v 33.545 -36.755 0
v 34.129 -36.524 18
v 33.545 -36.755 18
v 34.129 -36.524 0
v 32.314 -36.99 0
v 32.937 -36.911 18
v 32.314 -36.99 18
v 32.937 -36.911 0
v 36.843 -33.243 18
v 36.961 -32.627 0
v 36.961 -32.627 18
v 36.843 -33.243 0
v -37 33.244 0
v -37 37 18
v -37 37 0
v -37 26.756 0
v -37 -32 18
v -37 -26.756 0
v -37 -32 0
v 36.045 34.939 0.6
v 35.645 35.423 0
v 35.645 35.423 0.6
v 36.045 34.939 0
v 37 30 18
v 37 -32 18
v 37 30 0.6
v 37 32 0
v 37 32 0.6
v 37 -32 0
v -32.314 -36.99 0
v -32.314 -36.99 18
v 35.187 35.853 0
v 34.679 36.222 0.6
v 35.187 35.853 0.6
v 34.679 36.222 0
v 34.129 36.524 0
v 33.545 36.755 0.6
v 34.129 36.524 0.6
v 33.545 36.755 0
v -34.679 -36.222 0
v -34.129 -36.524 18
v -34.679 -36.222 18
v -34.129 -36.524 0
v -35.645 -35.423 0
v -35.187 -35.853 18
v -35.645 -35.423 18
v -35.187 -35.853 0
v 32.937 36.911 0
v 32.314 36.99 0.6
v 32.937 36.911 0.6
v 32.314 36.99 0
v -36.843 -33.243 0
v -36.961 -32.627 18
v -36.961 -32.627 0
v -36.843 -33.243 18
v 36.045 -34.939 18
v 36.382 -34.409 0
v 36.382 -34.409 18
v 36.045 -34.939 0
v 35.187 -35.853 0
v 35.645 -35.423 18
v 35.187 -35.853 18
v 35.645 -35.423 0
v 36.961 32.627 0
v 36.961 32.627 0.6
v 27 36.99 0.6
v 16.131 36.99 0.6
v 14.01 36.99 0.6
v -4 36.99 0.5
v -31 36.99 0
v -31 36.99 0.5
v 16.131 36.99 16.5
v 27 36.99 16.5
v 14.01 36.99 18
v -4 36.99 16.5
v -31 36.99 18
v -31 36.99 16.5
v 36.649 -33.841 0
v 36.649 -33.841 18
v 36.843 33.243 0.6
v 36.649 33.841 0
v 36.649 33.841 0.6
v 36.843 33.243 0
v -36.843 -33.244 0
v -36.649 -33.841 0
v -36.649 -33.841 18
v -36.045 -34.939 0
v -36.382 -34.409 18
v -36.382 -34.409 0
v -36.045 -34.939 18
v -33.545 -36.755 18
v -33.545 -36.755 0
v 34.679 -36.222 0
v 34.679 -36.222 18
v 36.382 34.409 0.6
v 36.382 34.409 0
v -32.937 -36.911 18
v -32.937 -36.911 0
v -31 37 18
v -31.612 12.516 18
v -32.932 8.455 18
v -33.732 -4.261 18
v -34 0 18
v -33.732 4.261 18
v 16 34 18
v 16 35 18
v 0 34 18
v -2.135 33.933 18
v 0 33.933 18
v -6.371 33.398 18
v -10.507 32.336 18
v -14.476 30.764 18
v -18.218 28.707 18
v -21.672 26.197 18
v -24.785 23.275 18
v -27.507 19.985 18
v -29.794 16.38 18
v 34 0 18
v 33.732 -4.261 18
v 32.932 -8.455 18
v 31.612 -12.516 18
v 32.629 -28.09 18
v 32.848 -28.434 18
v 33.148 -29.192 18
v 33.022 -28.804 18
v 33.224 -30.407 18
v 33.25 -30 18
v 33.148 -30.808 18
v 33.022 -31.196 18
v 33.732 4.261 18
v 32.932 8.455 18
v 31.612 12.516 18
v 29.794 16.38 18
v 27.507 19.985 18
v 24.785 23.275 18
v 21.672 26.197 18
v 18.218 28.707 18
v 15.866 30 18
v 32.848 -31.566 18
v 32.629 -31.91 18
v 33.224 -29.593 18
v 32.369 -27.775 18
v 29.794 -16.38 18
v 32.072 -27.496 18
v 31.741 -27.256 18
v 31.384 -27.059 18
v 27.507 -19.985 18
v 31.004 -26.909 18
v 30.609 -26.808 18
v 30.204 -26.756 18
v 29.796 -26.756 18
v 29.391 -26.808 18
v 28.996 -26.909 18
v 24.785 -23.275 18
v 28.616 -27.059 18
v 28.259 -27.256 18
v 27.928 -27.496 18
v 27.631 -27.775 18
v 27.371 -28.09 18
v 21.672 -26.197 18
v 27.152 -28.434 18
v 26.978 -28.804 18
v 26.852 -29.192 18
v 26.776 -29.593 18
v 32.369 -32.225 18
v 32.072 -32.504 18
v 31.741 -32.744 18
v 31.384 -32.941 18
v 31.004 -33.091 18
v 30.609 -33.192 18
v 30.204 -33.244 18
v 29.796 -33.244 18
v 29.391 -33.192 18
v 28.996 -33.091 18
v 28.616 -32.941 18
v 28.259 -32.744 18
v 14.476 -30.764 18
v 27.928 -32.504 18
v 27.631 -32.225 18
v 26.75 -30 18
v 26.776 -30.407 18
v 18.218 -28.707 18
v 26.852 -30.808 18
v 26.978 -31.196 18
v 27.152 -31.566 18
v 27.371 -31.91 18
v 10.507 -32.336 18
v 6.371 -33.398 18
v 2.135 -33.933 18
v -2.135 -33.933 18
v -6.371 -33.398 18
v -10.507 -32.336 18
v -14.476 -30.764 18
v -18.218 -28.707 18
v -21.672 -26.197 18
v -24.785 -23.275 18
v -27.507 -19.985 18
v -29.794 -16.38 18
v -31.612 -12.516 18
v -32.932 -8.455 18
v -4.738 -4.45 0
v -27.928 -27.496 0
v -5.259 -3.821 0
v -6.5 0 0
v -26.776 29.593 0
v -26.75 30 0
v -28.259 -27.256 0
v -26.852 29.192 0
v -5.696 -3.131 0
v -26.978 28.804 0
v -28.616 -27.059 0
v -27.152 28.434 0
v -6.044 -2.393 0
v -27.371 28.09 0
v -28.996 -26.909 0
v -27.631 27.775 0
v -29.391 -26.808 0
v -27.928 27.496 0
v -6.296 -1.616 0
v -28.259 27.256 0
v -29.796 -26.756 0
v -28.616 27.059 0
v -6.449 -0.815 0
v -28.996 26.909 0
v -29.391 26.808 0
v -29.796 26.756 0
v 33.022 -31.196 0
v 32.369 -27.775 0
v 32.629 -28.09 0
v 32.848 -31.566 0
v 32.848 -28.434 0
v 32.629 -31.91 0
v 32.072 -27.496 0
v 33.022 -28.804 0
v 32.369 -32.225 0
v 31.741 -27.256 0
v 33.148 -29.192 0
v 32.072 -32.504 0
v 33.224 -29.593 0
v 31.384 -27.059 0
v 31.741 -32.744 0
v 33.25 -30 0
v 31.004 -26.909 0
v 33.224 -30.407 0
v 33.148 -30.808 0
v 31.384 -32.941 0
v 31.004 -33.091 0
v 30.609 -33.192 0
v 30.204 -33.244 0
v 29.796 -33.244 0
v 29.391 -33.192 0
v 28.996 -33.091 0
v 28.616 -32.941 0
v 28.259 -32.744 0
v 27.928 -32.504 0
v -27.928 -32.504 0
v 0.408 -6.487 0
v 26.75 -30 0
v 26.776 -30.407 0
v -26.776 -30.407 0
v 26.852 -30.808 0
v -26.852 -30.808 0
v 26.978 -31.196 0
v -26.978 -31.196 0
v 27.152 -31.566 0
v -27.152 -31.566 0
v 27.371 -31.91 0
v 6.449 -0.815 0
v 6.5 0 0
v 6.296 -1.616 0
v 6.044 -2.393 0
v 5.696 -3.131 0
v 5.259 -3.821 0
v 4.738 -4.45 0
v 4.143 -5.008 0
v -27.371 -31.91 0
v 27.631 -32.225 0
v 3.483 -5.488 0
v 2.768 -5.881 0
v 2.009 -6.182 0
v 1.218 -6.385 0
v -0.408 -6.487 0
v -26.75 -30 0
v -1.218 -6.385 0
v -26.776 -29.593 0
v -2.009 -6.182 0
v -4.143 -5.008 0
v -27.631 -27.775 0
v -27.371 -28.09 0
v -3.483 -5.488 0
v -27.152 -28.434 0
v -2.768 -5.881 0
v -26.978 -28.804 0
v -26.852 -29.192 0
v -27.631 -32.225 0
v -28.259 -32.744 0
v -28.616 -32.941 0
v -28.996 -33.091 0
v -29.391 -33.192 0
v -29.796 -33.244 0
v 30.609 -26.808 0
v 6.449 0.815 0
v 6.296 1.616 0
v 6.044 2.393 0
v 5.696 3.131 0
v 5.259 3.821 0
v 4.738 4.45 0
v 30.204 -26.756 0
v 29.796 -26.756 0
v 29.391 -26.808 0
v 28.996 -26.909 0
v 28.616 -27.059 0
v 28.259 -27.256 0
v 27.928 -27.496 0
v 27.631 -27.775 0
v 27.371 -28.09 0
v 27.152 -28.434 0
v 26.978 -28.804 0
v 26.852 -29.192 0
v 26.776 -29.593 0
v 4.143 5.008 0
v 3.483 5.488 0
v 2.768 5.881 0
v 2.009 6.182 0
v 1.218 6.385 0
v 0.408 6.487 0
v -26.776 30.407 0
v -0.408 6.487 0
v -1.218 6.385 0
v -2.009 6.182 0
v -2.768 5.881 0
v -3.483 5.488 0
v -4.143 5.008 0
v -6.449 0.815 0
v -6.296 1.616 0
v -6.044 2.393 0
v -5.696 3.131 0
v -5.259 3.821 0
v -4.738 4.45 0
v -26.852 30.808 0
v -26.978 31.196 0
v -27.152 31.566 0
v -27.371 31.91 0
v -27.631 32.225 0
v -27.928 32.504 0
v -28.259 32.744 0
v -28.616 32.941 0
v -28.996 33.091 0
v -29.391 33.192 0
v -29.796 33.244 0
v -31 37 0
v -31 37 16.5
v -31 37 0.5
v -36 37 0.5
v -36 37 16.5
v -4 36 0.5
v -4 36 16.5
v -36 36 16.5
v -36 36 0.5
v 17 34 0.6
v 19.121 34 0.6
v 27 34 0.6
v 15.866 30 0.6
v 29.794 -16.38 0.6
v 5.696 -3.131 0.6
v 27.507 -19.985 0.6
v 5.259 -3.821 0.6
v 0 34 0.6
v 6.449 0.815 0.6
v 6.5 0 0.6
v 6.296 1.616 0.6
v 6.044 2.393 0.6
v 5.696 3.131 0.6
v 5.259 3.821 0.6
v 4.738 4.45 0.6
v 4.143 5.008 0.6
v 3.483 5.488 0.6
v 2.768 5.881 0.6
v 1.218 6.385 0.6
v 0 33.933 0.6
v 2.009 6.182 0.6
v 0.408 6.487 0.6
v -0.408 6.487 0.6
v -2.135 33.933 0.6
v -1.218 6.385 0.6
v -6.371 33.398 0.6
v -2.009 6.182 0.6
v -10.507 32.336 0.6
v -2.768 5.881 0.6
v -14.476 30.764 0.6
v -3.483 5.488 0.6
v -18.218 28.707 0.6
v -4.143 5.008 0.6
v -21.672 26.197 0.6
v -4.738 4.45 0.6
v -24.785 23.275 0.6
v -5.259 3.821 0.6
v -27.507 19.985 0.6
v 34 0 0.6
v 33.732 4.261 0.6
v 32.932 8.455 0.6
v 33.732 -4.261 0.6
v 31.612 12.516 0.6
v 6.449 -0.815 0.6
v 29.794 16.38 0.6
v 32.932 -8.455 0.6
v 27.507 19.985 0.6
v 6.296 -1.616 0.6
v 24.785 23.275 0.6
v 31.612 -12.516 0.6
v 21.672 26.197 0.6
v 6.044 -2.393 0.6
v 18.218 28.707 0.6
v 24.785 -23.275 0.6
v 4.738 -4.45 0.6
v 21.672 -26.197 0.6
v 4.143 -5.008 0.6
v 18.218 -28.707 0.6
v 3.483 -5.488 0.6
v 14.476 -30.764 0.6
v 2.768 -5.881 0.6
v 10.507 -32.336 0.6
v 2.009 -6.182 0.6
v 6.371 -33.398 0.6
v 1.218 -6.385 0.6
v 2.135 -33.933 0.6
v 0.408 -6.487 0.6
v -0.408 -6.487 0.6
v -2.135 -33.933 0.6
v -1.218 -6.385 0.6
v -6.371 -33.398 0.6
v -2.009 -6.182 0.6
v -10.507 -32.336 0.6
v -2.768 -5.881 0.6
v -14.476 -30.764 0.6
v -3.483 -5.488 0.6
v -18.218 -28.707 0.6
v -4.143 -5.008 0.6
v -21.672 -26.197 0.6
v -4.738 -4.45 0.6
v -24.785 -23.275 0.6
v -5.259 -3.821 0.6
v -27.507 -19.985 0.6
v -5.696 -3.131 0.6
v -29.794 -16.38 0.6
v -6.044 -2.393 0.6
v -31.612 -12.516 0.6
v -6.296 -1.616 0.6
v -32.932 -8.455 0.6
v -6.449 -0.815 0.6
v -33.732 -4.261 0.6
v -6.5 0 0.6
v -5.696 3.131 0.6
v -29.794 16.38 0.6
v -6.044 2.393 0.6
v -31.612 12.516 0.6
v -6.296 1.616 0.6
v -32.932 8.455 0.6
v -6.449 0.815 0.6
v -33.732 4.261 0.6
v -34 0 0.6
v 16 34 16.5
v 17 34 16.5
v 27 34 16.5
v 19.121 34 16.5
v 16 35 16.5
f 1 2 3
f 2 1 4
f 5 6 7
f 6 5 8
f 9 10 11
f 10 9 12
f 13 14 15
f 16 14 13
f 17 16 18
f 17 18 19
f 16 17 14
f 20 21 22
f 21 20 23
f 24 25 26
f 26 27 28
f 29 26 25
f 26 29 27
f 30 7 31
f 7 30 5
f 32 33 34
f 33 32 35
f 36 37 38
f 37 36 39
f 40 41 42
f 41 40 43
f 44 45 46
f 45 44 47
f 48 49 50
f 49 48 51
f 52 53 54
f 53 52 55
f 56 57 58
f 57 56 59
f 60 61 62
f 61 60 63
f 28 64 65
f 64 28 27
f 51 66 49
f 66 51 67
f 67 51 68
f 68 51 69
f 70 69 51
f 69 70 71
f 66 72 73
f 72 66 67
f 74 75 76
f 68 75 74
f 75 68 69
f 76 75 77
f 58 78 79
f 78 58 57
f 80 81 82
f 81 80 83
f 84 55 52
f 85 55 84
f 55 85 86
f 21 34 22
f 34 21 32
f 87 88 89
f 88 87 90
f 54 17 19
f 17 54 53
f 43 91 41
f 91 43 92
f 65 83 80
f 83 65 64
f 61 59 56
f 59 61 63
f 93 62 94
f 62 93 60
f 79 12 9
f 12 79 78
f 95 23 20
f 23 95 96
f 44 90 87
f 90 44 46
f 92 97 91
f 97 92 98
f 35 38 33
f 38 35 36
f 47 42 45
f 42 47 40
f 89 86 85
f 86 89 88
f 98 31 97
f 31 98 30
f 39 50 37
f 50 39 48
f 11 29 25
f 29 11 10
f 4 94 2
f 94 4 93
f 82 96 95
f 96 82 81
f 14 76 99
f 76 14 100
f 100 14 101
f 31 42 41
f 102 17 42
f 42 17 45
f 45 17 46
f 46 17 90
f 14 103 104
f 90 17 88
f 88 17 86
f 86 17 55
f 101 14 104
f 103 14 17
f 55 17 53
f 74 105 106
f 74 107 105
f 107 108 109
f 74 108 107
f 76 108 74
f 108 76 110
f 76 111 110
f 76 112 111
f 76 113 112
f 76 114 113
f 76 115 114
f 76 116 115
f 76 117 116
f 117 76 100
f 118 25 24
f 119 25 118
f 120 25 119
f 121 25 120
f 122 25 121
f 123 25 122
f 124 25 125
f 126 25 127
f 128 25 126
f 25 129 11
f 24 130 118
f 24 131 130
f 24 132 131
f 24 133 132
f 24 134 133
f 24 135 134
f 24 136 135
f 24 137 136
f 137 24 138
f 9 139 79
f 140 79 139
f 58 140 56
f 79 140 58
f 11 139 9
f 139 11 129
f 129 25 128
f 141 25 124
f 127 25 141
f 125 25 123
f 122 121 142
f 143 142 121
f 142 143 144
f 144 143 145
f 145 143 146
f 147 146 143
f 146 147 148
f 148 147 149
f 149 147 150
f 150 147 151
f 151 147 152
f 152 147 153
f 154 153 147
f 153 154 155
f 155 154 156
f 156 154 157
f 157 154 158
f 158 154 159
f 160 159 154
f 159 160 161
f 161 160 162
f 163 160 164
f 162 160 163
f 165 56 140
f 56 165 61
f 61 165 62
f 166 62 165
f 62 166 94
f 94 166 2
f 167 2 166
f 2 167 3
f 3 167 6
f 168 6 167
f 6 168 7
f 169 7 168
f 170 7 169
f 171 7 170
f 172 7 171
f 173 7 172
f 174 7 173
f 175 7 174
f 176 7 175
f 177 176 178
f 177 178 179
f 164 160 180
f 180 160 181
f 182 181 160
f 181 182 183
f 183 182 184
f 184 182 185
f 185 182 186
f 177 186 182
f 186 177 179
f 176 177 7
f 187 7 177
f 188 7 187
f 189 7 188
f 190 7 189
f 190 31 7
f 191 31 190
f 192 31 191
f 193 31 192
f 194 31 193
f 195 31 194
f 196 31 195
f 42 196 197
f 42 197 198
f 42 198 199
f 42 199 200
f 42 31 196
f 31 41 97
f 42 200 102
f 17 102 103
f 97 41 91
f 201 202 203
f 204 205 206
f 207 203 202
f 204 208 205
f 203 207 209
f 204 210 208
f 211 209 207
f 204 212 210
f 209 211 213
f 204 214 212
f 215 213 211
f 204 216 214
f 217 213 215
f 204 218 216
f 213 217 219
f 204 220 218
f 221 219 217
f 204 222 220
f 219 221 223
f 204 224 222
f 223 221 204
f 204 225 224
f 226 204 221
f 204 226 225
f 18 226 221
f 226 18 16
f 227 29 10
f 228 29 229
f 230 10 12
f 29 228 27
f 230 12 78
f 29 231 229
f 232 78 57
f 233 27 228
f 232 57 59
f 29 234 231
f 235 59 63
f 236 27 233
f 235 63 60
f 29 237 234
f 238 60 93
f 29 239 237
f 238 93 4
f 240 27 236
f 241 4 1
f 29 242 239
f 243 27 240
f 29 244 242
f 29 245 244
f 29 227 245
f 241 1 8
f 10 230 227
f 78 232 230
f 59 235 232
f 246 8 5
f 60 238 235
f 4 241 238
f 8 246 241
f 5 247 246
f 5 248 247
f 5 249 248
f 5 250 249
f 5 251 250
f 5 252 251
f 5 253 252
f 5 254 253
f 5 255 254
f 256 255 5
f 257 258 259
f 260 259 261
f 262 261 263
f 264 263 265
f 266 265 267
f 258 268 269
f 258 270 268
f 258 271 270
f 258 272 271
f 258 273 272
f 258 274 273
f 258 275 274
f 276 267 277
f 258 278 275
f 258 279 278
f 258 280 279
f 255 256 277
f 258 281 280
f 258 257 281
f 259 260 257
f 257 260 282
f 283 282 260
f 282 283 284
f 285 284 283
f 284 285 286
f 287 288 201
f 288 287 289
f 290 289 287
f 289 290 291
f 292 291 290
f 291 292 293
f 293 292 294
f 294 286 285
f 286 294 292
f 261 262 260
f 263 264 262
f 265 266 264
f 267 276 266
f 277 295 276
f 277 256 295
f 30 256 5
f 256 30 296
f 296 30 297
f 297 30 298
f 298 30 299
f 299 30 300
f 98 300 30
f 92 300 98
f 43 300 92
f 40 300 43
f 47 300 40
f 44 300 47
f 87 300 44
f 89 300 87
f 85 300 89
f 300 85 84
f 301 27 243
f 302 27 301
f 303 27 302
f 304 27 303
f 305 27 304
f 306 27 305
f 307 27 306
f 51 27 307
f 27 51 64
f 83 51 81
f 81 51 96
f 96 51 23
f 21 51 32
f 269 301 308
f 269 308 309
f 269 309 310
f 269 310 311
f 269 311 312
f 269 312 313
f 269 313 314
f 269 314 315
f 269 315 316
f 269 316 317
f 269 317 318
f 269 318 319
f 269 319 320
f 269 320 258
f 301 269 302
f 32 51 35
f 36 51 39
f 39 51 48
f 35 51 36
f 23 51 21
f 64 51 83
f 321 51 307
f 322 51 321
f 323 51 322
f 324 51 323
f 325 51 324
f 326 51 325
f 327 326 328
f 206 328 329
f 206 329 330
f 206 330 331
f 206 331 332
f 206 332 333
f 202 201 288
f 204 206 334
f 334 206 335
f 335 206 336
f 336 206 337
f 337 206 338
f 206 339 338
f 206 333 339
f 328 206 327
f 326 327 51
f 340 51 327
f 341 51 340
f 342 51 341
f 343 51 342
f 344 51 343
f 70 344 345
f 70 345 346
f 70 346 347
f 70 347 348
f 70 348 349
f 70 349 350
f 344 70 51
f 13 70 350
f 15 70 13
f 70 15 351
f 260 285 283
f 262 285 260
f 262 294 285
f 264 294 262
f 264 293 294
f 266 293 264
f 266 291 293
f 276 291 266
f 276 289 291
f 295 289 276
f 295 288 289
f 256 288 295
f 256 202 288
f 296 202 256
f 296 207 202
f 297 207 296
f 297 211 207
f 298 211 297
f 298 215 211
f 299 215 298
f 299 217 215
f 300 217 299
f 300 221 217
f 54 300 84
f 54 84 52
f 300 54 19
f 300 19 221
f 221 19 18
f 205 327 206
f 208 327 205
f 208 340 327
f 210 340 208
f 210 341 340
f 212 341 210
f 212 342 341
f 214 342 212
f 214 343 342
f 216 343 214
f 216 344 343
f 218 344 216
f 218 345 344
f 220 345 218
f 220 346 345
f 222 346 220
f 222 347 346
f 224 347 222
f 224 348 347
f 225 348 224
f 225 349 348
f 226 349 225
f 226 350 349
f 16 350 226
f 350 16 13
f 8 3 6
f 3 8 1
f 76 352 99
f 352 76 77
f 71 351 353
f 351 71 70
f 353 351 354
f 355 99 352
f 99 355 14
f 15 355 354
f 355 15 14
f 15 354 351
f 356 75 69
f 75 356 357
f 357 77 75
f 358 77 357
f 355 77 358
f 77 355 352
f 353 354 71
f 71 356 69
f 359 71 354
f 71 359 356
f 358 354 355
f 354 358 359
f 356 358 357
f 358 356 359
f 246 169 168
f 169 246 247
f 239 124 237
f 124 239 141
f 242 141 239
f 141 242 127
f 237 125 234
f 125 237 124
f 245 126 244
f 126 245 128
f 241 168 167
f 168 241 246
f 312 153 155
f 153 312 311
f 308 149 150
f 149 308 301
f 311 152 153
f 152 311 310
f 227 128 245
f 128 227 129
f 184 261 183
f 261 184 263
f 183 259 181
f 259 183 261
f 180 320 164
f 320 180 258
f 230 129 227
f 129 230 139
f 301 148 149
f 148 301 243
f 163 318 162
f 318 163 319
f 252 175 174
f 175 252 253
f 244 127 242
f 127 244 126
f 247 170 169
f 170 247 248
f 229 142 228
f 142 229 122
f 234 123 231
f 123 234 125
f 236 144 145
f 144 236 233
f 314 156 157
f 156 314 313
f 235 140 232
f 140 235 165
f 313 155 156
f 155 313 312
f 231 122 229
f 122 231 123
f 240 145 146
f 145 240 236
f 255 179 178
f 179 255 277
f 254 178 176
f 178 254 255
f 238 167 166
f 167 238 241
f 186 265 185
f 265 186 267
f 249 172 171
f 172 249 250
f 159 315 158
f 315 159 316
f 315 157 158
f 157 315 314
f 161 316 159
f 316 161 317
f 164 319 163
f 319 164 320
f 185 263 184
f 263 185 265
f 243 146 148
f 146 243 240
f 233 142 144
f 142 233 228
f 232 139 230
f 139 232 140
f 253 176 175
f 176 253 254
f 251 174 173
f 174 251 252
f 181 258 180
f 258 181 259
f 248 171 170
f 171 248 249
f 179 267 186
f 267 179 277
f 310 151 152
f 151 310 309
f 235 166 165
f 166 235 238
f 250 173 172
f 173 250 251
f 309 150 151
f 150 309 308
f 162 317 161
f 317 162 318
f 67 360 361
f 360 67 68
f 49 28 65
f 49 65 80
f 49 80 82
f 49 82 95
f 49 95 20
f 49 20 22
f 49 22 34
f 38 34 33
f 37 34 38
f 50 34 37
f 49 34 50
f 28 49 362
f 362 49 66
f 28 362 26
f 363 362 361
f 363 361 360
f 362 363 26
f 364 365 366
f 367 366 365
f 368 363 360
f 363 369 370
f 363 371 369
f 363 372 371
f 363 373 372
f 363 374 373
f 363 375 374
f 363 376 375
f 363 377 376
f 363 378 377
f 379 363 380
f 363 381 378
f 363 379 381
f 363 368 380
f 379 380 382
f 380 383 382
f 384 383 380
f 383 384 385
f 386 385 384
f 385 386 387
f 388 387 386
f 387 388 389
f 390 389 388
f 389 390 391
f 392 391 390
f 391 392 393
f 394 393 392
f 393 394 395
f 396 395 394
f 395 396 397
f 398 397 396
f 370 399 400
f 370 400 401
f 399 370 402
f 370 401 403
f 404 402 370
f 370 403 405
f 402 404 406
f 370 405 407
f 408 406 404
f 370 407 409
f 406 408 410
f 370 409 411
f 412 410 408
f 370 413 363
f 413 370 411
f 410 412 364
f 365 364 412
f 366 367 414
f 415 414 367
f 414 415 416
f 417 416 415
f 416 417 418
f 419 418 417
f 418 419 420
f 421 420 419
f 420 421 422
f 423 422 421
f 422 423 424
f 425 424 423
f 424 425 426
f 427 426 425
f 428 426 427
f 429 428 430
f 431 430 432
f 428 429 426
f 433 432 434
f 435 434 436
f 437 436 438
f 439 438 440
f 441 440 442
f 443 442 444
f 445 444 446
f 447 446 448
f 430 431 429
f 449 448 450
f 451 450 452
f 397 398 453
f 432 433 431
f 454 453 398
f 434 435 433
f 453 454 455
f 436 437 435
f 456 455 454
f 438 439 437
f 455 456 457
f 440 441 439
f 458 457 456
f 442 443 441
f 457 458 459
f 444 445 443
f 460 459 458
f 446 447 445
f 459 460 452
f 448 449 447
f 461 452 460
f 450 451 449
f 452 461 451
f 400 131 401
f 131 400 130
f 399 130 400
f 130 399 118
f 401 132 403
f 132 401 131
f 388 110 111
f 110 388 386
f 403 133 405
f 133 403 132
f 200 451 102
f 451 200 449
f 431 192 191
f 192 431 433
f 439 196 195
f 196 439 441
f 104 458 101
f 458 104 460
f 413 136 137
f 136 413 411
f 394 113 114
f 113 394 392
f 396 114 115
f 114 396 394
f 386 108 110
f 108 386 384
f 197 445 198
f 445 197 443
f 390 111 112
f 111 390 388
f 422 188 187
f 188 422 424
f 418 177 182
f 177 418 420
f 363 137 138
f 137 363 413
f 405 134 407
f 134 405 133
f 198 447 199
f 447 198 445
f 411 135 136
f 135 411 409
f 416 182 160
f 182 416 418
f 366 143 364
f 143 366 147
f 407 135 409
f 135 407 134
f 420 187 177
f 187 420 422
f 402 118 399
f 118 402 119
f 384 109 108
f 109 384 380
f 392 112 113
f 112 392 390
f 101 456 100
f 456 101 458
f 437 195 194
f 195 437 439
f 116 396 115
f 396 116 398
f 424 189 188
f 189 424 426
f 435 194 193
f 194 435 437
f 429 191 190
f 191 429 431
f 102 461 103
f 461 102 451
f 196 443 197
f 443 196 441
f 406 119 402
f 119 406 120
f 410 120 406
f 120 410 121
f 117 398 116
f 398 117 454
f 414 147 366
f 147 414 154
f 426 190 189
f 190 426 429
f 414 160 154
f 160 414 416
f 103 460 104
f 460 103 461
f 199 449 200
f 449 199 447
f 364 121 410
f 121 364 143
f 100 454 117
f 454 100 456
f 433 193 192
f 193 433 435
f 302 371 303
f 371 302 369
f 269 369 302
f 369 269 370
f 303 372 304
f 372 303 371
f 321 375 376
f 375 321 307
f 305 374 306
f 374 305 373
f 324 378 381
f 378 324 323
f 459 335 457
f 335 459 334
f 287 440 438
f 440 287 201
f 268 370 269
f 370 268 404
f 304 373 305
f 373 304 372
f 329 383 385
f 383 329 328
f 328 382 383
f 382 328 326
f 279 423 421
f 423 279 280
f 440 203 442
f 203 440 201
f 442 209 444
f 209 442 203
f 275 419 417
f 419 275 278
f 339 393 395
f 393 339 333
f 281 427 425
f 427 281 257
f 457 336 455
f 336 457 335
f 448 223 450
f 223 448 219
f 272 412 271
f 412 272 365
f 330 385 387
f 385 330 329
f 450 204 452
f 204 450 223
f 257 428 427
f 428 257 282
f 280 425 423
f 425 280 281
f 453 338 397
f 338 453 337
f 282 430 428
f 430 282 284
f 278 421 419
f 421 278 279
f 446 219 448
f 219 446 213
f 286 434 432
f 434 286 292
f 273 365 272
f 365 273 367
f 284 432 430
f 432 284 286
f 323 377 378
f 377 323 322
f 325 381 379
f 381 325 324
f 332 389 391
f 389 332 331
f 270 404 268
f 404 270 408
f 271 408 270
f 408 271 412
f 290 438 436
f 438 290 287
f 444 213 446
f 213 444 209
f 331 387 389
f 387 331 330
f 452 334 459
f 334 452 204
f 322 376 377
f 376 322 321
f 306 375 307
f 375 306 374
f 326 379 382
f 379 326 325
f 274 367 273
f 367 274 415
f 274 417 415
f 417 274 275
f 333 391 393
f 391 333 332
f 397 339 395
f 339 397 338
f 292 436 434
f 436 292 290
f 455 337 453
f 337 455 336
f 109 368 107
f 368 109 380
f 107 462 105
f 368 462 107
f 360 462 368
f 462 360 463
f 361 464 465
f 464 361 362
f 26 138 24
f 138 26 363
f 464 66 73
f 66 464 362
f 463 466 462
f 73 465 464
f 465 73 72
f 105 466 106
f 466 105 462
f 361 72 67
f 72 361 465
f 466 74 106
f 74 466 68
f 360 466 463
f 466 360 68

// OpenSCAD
$fn = 50;


difference() {
	union() {
		hull() {
			translate(v = [-32.0000000000, 32.0000000000, 0]) {
				cylinder(h = 18, r = 5);
			}
			translate(v = [32.0000000000, 32.0000000000, 0]) {
				cylinder(h = 18, r = 5);
			}
			translate(v = [-32.0000000000, -32.0000000000, 0]) {
				cylinder(h = 18, r = 5);
			}
			translate(v = [32.0000000000, -32.0000000000, 0]) {
				cylinder(h = 18, r = 5);
			}
		}
		translate(v = [-37.0000000000, 31.0000000000, 0]) {
			cube(size = [6, 6, 18]);
		}
	}
	union() {
		translate(v = [-37.5000000000, -30.0000000000, -250.0000000000]) {
			rotate(a = [0, 0, 0]) {
				difference() {
					union() {
						hull() {
							translate(v = [7.5000000000, 0, 0]) {
								cylinder(h = 250, r = 3.2500000000, r1 = 3.2500000000, r2 = 3.2500000000);
							}
							translate(v = [-7.5000000000, 0, 0]) {
								cylinder(h = 250, r = 3.2500000000, r1 = 3.2500000000, r2 = 3.2500000000);
							}
						}
					}
					union();
				}
			}
		}
		translate(v = [-37.5000000000, 30.0000000000, -250.0000000000]) {
			rotate(a = [0, 0, 0]) {
				difference() {
					union() {
						hull() {
							translate(v = [7.5000000000, 0, 0]) {
								cylinder(h = 250, r = 3.2500000000, r1 = 3.2500000000, r2 = 3.2500000000);
							}
							translate(v = [-7.5000000000, 0, 0]) {
								cylinder(h = 250, r = 3.2500000000, r1 = 3.2500000000, r2 = 3.2500000000);
							}
						}
					}
					union();
				}
			}
		}
		translate(v = [-36.0000000000, 36.0000000000, 0.5000000000]) {
			cube(size = [32, 1, 16]);
		}
		translate(v = [30.0000000000, -30.0000000000, -50.0000000000]) {
			cylinder(h = 100, r = 3.2500000000);
		}
		translate(v = [0, 0, 0.6000000000]) {
			cylinder(h = 20.4000000000, r = 34.0000000000);
		}
		translate(v = [0, 0, -9.0000000000]) {
			cylinder(h = 18, r = 6.5000000000);
		}
		translate(v = [0.0000000000, 30.0000000000, 0.6000000000]) {
			cube(size = [37.0000000000, 4, 20.4000000000]);
		}
		translate(v = [27.0000000000, 30.0000000000, 0.6000000000]) {
			cube(size = [10, 7, 20.4000000000]);
		}
		translate(v = [16.0000000000, 30.0000000000, 16.5000000000]) {
			cube(size = [21, 7, 1.5000000000]);
		}
		translate(v = [13.2500000000, 37.7500000000, 0.6000000000]) {
			rotate(a = [0, 0, -45]) {
				cube(size = [7.5000000000, 1.5000000000, 20.4000000000]);
			}
		}
		translate(v = [7.0610000000, 28.0000000000, 0.6000000000]) {
			cube(size = [7.5000000000, 2, 17.4000000000]);
		}
	}
}
